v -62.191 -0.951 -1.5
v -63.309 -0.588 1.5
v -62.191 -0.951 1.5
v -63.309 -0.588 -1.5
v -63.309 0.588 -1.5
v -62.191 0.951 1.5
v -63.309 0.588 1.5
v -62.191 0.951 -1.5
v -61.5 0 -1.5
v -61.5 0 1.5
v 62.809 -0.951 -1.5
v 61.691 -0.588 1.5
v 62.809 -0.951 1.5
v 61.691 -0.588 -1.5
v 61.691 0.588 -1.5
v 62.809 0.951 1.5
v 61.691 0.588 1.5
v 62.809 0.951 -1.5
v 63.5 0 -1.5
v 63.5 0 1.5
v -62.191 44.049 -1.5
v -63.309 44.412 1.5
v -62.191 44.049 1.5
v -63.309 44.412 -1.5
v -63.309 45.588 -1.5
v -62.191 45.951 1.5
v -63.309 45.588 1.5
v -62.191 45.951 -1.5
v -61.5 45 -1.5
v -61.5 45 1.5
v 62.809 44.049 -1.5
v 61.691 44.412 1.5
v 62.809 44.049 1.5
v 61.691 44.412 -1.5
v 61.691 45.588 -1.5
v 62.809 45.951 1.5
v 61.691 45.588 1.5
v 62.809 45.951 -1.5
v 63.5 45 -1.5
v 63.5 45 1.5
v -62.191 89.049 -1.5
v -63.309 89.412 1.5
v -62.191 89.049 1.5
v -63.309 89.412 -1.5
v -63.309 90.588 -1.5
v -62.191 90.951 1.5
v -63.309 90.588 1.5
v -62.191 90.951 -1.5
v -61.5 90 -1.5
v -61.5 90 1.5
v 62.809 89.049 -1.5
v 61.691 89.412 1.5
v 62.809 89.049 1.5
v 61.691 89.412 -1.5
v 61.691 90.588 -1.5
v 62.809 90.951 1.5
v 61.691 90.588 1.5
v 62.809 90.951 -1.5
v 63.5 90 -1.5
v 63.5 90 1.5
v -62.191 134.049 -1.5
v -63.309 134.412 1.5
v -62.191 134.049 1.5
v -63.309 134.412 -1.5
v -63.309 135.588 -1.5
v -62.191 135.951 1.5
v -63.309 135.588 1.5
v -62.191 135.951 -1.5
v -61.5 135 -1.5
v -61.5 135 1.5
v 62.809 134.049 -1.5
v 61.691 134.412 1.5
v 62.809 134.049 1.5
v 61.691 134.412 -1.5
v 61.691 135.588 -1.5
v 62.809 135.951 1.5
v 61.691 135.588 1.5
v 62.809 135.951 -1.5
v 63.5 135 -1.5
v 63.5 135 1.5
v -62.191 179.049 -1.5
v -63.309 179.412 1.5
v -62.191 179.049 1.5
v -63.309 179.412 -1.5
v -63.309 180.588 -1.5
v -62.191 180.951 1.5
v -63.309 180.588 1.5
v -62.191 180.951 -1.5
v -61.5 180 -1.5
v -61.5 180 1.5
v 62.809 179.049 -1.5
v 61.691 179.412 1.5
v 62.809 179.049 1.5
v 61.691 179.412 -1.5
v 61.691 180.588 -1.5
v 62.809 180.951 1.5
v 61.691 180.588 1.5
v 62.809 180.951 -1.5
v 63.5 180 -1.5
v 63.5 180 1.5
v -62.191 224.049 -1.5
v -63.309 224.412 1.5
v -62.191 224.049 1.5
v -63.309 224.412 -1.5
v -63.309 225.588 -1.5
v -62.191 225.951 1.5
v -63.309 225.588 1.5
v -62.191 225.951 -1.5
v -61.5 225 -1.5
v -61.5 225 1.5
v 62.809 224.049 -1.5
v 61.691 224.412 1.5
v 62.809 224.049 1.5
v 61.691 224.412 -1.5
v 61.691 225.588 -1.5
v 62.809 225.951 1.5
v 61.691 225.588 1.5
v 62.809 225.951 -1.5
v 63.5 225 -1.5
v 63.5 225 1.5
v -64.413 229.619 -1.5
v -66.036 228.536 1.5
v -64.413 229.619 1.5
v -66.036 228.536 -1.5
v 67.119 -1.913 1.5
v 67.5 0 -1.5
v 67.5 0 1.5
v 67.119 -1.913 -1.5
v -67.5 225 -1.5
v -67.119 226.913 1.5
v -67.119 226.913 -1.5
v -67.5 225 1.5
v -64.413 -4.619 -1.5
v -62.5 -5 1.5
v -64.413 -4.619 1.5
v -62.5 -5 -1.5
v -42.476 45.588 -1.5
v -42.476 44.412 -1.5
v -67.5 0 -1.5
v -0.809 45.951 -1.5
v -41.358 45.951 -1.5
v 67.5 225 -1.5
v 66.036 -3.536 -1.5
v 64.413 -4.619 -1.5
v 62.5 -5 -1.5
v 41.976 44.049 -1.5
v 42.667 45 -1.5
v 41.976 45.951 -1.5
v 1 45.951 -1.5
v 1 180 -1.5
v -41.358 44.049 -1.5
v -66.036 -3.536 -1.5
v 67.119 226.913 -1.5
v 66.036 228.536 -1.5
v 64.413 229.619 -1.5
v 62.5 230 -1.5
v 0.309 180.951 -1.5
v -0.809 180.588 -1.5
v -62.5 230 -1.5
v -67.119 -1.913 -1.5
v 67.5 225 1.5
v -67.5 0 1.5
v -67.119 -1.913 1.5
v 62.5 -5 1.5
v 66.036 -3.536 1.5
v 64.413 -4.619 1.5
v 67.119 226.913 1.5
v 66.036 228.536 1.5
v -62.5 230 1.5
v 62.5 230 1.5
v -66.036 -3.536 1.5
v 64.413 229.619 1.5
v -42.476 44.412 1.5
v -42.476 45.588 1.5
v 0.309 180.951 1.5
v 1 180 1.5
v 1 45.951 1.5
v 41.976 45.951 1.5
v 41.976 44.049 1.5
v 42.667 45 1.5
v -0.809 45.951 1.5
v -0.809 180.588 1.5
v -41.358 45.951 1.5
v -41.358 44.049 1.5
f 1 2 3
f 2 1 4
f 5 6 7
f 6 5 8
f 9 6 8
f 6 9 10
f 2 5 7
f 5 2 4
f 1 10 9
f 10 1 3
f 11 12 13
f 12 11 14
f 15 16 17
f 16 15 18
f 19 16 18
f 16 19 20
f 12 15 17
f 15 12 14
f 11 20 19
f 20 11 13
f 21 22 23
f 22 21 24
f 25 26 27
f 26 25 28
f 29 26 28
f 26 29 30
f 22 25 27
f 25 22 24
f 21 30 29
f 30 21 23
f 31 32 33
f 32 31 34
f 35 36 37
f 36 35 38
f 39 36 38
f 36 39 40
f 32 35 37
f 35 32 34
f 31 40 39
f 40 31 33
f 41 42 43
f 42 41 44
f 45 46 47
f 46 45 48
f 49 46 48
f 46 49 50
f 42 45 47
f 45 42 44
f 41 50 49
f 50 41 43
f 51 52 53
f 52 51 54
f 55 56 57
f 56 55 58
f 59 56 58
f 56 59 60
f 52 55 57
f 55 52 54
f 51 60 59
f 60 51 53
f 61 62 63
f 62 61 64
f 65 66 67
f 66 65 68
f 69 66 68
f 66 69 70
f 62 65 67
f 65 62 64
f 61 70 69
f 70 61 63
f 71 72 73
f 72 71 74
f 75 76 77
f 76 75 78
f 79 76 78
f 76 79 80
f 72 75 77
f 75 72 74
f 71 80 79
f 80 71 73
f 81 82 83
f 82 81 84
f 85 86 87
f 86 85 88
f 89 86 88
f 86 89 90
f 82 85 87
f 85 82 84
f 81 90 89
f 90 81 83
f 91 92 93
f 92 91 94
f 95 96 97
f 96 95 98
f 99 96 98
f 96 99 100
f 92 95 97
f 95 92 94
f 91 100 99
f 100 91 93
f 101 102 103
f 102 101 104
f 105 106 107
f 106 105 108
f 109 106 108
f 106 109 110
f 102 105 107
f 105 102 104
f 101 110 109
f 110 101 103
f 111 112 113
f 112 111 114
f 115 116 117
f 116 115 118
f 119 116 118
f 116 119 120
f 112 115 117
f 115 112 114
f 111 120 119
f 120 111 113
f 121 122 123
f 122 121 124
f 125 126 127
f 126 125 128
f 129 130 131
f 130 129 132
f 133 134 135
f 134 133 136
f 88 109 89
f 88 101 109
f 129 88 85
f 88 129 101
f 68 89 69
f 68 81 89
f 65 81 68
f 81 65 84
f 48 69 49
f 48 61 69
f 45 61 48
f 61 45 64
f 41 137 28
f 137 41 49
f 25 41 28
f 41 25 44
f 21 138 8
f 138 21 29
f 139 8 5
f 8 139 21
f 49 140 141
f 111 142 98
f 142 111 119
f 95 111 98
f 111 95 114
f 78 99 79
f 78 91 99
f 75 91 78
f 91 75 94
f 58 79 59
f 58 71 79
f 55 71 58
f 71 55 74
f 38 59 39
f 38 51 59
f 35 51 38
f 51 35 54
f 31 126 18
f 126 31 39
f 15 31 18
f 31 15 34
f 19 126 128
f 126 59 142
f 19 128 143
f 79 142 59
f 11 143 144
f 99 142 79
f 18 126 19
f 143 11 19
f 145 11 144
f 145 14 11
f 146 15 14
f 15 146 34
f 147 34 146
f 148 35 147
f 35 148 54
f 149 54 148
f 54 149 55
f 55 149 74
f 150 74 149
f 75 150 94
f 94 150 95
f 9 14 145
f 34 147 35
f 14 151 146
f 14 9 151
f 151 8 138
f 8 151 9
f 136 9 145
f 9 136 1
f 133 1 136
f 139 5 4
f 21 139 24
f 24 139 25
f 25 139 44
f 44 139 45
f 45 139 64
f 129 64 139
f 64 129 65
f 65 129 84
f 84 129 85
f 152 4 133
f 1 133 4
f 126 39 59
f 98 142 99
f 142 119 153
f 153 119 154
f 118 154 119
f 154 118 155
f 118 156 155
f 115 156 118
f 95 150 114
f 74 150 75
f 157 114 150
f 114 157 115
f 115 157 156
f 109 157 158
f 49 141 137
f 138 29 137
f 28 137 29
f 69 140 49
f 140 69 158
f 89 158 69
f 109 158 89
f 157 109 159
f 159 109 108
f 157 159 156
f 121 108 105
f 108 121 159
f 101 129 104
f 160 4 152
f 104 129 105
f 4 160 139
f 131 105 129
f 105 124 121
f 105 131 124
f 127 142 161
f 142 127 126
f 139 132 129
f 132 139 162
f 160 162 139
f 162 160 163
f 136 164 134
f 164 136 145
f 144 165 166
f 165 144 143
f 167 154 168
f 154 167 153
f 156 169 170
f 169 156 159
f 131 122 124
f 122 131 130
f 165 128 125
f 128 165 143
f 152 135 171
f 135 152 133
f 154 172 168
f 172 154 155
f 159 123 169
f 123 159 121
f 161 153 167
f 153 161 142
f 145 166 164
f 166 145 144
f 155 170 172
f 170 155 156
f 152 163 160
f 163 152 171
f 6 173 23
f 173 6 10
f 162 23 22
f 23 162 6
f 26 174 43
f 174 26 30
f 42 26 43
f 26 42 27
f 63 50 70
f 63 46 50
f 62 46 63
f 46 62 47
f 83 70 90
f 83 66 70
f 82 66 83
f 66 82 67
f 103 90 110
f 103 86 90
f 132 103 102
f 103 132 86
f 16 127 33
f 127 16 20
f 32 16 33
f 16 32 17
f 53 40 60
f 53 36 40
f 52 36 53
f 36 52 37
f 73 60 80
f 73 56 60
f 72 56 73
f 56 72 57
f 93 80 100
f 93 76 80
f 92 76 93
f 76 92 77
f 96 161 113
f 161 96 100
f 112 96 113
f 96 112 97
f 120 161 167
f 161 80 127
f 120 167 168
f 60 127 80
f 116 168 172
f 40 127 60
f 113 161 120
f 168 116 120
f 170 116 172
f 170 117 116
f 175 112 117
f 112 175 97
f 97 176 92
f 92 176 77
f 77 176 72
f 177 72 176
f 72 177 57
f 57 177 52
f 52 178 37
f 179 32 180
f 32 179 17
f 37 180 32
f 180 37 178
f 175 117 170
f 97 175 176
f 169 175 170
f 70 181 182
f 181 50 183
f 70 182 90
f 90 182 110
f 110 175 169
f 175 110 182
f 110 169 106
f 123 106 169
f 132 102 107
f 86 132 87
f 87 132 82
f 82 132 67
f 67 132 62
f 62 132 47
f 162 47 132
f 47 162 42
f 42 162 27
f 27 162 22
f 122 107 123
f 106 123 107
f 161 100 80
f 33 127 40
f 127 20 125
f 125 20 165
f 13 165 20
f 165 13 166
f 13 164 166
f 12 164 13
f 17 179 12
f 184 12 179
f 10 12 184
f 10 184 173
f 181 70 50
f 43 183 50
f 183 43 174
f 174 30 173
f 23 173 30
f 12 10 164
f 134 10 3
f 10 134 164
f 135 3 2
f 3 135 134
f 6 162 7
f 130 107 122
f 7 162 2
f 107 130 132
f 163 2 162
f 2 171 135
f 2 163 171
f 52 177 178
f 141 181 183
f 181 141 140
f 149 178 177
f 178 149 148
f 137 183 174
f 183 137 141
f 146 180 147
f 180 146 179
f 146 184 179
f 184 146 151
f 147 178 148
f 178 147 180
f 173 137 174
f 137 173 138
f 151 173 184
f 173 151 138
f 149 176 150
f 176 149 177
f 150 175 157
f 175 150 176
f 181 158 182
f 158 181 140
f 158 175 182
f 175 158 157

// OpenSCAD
dx=125;
dy=45;

difference(){
    hull(){
       place() cylinder(h=3, r=5, center=true); 
    
    }
    
    hull(){
        for(j=[-1,1]) translate([dx/3*j, dy*1, 0]) cylinder(h=50, r=1, center=true);
    }
    
    hull(){
        for(i=[1:4]) translate([0, dy*i, 0]) cylinder(h=50, r=1, center=true);
    }   
    
    place() cylinder(h=50, r=1, center=true);
}

module place(){
    for(i=[0:5]) for(j=[-1,1]) translate([dx/2*j, dy*i, 0]) children(0);
}
